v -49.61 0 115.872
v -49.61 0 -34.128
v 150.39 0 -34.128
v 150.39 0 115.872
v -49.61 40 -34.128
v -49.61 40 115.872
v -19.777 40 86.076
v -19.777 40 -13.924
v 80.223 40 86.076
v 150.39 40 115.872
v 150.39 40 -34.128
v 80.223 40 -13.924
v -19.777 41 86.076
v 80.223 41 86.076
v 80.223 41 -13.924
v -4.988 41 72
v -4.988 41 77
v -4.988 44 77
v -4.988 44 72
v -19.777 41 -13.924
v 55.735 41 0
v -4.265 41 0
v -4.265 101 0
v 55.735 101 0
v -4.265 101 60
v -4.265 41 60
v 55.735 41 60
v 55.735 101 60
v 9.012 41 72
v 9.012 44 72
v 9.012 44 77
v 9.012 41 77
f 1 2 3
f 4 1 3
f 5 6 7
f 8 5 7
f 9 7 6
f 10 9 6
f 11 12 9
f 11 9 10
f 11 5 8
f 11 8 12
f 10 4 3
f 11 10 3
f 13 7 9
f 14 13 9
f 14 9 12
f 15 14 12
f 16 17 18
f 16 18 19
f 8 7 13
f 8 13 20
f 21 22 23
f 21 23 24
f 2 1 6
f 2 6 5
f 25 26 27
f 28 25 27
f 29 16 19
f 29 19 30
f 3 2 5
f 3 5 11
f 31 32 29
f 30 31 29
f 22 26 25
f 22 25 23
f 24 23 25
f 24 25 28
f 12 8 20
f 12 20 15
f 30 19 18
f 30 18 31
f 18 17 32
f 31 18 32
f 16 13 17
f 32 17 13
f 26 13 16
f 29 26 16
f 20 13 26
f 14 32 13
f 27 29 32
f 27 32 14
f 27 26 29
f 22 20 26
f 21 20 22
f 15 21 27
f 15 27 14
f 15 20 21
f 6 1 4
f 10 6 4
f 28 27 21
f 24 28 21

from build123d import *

# Parameters (mm, degrees)
SKETCH_10_W       = 200
SKETCH_10_H       = 150
EXTRUDE_401_DEPTH = 40
SKETCH_11_W       = 100
SKETCH_11_H       = 100
EXTRUDE_558_DEPTH = 1
SKETCH_12_W       = 60
SKETCH_12_H       = 60
EXTRUDE_709_DEPTH = 60
SKETCH_13_W       = 14
SKETCH_13_H       = 5
EXTRUDE_893_DEPTH = 3


with BuildPart() as part:
    # Эскиз10 → Extrude 401 (new body)
    with BuildSketch(Plane(origin=(0, 0, 0), x_dir=(1, 0, 0), z_dir=(0, 1, 0))):
        with Locations((50.389807825, -40.872183235)):
            Rectangle(SKETCH_10_W, SKETCH_10_H)
    extrude(amount=EXTRUDE_401_DEPTH)

    # Эскиз11 → Extrude 558 (add)
    with BuildSketch(Plane(origin=(0, 40, 0), x_dir=(1, 0, 0), z_dir=(0, 1, 0))):
        with Locations((30.223196857, -36.076377212)):
            Rectangle(SKETCH_11_W, SKETCH_11_H)
    extrude(amount=EXTRUDE_558_DEPTH)

    # Эскиз12 → Extrude 709 (add)
    with BuildSketch(Plane(origin=(0, 41, 0), x_dir=(1, 0, 0), z_dir=(0, 1, 0))):
        with Locations((25.734840207, -30)):
            Rectangle(SKETCH_12_W, SKETCH_12_H)
    extrude(amount=EXTRUDE_709_DEPTH)

    # Эскиз13 → Extrude 893 (add)
    with BuildSketch(Plane(origin=(0, 41, 0), x_dir=(1, 0, 0), z_dir=(0, 1, 0))):
        with Locations((2.012297913, -74.500076324)):
            Rectangle(SKETCH_13_W, SKETCH_13_H)
    extrude(amount=EXTRUDE_893_DEPTH)


solid = part.part
